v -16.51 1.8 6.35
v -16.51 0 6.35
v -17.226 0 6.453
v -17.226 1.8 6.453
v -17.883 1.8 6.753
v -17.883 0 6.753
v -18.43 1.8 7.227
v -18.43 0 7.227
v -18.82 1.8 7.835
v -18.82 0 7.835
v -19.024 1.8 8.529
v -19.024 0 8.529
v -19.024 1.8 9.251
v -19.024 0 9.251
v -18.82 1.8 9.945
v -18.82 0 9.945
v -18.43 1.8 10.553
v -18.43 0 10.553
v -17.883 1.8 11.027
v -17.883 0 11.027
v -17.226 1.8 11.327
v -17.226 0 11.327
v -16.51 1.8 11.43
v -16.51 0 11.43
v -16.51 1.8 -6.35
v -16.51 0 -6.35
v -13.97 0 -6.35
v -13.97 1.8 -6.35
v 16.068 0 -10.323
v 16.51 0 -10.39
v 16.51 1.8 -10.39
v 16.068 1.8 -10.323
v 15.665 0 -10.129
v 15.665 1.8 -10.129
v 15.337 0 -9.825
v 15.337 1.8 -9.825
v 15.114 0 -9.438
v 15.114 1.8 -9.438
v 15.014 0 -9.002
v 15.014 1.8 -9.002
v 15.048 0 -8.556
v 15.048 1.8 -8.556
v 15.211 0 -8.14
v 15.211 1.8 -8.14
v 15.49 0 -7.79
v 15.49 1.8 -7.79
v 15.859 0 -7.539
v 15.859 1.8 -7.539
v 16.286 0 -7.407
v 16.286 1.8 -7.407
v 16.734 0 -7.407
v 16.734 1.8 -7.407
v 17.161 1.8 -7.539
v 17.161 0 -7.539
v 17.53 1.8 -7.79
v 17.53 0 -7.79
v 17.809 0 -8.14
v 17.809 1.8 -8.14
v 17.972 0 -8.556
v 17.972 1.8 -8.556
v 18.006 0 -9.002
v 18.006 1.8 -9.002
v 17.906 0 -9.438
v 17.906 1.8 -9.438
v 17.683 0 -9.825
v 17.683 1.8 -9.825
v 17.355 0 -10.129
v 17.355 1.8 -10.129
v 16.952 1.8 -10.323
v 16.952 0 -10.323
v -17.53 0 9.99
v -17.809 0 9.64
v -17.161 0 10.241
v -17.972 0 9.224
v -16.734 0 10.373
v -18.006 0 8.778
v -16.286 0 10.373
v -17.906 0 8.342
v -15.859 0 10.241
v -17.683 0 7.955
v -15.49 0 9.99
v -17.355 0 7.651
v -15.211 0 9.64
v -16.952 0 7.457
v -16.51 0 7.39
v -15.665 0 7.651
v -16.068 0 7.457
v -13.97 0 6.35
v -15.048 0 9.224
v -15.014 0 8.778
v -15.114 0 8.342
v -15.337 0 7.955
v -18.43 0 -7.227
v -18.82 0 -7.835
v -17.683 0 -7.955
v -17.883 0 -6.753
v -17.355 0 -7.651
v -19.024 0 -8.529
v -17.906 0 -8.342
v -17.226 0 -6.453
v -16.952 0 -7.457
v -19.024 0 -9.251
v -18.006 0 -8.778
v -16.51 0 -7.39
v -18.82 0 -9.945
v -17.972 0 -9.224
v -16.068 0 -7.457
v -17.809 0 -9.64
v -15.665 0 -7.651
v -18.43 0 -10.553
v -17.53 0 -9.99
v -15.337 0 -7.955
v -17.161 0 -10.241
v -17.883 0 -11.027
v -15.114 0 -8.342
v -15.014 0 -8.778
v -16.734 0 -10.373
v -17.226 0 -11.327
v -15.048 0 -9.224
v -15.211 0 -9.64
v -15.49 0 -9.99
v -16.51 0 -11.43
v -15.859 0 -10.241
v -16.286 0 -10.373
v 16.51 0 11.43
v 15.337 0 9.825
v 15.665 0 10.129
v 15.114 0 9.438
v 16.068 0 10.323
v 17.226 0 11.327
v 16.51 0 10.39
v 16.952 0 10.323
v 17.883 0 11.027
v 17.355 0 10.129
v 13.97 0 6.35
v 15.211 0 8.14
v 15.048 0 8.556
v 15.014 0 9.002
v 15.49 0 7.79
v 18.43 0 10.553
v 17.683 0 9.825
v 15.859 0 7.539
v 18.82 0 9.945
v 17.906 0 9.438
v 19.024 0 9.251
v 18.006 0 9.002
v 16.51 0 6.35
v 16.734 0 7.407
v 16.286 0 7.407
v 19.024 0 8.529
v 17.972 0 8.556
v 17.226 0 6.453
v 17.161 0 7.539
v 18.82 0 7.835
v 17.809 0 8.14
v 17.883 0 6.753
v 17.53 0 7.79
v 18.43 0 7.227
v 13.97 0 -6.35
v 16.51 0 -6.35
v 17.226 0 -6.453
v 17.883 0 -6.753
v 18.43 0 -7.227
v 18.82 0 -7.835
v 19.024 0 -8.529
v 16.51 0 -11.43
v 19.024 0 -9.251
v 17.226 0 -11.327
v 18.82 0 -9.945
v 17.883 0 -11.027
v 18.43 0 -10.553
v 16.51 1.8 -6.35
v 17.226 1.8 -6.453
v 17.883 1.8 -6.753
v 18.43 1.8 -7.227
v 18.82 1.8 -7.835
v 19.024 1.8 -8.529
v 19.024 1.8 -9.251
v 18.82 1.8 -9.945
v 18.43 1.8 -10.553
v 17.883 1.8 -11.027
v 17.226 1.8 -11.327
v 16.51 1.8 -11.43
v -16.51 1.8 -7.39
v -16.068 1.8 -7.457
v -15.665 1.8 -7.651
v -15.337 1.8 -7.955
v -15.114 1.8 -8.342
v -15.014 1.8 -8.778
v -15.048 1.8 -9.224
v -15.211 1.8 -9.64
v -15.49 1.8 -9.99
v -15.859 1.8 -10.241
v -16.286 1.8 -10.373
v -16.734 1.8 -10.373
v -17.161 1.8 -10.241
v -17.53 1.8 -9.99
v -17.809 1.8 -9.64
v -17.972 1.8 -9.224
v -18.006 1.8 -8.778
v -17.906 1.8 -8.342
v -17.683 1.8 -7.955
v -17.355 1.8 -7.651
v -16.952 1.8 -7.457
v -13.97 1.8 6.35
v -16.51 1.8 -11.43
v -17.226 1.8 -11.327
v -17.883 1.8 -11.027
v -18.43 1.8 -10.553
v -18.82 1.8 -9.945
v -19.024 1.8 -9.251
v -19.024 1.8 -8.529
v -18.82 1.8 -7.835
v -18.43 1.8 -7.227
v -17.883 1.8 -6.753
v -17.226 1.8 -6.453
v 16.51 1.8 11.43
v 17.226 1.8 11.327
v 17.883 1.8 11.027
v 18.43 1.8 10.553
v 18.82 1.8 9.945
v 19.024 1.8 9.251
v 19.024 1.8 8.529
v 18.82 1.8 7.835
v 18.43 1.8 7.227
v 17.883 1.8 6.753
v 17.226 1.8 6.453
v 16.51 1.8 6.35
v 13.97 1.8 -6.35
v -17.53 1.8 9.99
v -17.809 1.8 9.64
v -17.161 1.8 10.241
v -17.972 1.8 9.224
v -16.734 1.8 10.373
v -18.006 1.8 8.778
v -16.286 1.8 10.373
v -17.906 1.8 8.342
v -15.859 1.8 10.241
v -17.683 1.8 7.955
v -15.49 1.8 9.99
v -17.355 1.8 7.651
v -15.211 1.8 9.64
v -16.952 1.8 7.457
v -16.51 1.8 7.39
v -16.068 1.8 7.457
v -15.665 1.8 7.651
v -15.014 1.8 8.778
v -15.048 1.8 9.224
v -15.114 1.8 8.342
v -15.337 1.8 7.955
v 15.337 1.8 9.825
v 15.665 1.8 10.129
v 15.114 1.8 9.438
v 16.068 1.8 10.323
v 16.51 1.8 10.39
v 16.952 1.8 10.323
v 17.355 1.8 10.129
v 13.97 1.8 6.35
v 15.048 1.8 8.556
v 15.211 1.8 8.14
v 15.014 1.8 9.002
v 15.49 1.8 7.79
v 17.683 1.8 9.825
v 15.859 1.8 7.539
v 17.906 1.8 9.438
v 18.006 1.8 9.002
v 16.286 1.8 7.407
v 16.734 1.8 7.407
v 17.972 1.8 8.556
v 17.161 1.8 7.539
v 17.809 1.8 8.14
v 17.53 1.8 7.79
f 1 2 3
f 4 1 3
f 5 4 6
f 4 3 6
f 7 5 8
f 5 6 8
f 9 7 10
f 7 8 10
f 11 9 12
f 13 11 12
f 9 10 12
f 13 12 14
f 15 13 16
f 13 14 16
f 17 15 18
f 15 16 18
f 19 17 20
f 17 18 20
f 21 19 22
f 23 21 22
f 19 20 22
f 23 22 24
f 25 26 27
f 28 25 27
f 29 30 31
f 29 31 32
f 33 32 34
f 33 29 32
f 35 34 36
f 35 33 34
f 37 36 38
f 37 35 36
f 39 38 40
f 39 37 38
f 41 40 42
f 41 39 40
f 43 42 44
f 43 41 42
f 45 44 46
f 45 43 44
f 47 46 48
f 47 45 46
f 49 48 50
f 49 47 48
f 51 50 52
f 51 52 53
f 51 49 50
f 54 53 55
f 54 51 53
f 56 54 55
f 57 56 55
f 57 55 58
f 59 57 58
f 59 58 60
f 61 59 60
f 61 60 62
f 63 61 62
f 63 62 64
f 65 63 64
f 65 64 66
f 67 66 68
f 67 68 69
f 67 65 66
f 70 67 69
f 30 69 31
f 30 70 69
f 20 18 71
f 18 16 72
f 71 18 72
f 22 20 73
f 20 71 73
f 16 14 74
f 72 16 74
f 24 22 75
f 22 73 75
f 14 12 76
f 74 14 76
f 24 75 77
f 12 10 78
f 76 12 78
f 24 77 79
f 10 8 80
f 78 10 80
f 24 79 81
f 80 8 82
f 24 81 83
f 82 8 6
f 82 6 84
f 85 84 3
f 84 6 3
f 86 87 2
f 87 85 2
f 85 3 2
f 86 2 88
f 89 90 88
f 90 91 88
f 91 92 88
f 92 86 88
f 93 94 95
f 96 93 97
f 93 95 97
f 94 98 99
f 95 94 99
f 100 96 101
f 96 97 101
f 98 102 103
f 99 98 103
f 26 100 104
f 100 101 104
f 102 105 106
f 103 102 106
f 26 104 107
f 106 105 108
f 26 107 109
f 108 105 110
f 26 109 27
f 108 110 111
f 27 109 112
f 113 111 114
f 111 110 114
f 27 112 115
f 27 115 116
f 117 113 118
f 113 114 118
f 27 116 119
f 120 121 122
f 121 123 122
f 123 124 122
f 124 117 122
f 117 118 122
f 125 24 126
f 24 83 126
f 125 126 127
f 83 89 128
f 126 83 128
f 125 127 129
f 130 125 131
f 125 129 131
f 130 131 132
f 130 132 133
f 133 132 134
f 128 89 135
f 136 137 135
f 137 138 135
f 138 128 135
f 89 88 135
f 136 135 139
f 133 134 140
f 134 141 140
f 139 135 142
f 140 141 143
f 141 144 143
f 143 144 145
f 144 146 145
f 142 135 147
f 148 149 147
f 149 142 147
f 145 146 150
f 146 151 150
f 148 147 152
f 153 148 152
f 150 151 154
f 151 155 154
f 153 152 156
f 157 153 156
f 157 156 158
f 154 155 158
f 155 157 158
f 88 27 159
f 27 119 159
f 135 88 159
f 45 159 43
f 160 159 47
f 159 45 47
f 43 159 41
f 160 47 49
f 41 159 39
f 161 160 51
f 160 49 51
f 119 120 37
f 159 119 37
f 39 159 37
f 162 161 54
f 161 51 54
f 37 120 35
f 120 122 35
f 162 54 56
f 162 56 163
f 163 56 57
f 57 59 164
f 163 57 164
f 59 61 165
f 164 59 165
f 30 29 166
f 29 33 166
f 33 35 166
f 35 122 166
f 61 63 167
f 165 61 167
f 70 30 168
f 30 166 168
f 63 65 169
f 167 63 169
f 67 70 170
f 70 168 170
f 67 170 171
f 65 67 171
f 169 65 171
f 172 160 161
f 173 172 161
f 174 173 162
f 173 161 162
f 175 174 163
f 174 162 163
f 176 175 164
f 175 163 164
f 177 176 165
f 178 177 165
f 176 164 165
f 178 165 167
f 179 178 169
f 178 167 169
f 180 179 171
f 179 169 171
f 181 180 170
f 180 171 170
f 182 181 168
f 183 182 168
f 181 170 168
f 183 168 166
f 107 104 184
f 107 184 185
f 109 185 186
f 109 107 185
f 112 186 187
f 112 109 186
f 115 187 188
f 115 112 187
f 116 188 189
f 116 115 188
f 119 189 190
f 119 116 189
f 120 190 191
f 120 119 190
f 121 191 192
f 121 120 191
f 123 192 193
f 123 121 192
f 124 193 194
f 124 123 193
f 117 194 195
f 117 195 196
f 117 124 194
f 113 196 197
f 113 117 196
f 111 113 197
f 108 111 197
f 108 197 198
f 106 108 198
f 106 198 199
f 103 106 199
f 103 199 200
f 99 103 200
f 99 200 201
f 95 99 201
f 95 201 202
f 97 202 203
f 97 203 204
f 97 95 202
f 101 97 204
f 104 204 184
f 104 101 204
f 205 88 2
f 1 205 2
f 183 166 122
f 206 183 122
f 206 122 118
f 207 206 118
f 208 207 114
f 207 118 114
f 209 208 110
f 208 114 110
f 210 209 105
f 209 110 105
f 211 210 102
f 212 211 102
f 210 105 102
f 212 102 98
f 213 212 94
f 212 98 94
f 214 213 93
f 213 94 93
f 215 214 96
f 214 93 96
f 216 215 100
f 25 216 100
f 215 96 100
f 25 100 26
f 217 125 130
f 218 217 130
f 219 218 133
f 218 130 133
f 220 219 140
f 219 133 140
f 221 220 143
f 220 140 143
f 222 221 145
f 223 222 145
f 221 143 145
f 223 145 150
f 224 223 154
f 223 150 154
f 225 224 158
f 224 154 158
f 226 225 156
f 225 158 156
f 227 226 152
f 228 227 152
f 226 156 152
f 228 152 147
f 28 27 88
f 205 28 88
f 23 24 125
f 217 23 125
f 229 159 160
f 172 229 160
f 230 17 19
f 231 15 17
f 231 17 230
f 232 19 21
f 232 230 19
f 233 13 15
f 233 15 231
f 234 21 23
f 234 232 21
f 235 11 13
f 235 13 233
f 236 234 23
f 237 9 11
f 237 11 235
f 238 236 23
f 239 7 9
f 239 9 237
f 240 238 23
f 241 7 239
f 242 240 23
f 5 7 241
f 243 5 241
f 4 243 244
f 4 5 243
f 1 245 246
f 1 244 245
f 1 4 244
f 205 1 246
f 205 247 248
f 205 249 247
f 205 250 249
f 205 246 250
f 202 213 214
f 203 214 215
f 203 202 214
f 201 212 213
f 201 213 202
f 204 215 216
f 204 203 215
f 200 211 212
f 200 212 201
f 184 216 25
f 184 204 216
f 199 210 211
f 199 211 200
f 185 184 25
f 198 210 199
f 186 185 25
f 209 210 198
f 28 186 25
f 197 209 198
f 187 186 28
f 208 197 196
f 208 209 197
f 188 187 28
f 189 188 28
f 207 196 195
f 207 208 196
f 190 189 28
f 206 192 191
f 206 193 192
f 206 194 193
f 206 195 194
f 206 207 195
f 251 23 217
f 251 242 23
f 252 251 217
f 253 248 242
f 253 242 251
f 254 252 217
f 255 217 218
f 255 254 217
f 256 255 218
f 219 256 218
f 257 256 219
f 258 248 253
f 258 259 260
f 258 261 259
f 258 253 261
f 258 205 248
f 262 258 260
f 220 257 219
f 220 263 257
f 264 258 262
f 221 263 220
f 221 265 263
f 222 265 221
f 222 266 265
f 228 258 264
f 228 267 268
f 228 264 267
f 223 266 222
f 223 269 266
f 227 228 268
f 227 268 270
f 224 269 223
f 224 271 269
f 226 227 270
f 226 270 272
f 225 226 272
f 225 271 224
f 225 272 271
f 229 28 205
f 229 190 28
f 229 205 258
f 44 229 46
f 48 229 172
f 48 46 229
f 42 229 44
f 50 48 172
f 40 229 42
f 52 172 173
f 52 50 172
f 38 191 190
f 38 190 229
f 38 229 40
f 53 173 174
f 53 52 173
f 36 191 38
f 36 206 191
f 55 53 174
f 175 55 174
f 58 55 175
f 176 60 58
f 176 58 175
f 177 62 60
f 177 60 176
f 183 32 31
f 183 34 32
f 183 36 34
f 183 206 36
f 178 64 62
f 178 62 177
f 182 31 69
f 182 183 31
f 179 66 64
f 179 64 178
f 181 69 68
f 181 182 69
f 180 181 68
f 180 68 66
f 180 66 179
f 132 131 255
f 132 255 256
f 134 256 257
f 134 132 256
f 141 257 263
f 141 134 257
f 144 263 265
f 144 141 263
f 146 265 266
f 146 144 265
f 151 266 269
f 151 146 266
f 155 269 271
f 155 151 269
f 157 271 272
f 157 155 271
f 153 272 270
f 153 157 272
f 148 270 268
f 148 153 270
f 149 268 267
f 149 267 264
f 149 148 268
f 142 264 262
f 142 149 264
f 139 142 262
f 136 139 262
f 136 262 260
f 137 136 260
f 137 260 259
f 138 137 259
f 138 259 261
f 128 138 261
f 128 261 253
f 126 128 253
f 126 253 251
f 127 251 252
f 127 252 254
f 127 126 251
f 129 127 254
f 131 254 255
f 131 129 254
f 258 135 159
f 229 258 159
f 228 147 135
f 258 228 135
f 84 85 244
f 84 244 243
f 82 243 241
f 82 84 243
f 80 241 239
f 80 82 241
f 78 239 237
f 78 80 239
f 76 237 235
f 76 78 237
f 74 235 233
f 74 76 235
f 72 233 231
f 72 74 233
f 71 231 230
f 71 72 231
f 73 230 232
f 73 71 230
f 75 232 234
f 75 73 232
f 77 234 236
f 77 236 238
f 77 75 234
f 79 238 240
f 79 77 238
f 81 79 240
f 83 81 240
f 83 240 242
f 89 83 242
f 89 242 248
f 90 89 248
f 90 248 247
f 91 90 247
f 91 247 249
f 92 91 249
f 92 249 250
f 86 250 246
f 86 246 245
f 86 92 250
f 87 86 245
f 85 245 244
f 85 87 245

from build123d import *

# Parameters (mm, degrees)
CROQUIS1_R              = 1.5
SALIENTE_EXTRUIR1_DEPTH = 1.8


with BuildPart() as part:
    # Croquis1 → Saliente-Extruir1 (new body)
    with BuildSketch(Plane(origin=(0, 0, 0), x_dir=(1, 0, 0), z_dir=(0, 1, 0))):
        with BuildLine():
            Line((-13.97, 11.43), (-16.51, 11.43))
            ThreePointArc((-16.51, 11.43), (-19.05, 8.89), (-16.51, 6.35))
            Line((-16.51, 6.35), (-13.97, 6.35))
            Line((-13.97, 6.35), (-13.97, -6.35))
            Line((-13.97, -6.35), (-16.51, -6.35))
            ThreePointArc((-16.51, -6.35), (-19.05, -8.89), (-16.51, -11.43))
            Line((-16.51, -11.43), (-13.97, -11.43))
            Line((-13.97, -11.43), (13.97, -11.43))
            Line((13.97, -11.43), (16.51, -11.43))
            ThreePointArc((16.51, -11.43), (19.05, -8.89), (16.51, -6.35))
            Line((16.51, -6.35), (13.97, -6.35))
            Line((13.97, -6.35), (13.97, 6.35))
            Line((13.97, 6.35), (16.51, 6.35))
            ThreePointArc((16.51, 6.35), (19.05, 8.89), (16.51, 11.43))
            Line((16.51, 11.43), (13.97, 11.43))
            Line((13.97, 11.43), (-13.97, 11.43))
        make_face()
        with Locations(Location((-16.51, 8.89, 0), (0, 0, 270))):
            Circle(CROQUIS1_R, mode=Mode.SUBTRACT)
        with Locations(Location((16.51, 8.89, 0), (0, 0, 90))):
            Circle(CROQUIS1_R, mode=Mode.SUBTRACT)
        with Locations(Location((16.51, -8.89, 0), (0, 0, 270))):
            Circle(CROQUIS1_R, mode=Mode.SUBTRACT)
        with Locations(Location((-16.51, -8.89, 0), (0, 0, 90))):
            Circle(CROQUIS1_R, mode=Mode.SUBTRACT)
    extrude(amount=SALIENTE_EXTRUIR1_DEPTH)


solid = part.part
